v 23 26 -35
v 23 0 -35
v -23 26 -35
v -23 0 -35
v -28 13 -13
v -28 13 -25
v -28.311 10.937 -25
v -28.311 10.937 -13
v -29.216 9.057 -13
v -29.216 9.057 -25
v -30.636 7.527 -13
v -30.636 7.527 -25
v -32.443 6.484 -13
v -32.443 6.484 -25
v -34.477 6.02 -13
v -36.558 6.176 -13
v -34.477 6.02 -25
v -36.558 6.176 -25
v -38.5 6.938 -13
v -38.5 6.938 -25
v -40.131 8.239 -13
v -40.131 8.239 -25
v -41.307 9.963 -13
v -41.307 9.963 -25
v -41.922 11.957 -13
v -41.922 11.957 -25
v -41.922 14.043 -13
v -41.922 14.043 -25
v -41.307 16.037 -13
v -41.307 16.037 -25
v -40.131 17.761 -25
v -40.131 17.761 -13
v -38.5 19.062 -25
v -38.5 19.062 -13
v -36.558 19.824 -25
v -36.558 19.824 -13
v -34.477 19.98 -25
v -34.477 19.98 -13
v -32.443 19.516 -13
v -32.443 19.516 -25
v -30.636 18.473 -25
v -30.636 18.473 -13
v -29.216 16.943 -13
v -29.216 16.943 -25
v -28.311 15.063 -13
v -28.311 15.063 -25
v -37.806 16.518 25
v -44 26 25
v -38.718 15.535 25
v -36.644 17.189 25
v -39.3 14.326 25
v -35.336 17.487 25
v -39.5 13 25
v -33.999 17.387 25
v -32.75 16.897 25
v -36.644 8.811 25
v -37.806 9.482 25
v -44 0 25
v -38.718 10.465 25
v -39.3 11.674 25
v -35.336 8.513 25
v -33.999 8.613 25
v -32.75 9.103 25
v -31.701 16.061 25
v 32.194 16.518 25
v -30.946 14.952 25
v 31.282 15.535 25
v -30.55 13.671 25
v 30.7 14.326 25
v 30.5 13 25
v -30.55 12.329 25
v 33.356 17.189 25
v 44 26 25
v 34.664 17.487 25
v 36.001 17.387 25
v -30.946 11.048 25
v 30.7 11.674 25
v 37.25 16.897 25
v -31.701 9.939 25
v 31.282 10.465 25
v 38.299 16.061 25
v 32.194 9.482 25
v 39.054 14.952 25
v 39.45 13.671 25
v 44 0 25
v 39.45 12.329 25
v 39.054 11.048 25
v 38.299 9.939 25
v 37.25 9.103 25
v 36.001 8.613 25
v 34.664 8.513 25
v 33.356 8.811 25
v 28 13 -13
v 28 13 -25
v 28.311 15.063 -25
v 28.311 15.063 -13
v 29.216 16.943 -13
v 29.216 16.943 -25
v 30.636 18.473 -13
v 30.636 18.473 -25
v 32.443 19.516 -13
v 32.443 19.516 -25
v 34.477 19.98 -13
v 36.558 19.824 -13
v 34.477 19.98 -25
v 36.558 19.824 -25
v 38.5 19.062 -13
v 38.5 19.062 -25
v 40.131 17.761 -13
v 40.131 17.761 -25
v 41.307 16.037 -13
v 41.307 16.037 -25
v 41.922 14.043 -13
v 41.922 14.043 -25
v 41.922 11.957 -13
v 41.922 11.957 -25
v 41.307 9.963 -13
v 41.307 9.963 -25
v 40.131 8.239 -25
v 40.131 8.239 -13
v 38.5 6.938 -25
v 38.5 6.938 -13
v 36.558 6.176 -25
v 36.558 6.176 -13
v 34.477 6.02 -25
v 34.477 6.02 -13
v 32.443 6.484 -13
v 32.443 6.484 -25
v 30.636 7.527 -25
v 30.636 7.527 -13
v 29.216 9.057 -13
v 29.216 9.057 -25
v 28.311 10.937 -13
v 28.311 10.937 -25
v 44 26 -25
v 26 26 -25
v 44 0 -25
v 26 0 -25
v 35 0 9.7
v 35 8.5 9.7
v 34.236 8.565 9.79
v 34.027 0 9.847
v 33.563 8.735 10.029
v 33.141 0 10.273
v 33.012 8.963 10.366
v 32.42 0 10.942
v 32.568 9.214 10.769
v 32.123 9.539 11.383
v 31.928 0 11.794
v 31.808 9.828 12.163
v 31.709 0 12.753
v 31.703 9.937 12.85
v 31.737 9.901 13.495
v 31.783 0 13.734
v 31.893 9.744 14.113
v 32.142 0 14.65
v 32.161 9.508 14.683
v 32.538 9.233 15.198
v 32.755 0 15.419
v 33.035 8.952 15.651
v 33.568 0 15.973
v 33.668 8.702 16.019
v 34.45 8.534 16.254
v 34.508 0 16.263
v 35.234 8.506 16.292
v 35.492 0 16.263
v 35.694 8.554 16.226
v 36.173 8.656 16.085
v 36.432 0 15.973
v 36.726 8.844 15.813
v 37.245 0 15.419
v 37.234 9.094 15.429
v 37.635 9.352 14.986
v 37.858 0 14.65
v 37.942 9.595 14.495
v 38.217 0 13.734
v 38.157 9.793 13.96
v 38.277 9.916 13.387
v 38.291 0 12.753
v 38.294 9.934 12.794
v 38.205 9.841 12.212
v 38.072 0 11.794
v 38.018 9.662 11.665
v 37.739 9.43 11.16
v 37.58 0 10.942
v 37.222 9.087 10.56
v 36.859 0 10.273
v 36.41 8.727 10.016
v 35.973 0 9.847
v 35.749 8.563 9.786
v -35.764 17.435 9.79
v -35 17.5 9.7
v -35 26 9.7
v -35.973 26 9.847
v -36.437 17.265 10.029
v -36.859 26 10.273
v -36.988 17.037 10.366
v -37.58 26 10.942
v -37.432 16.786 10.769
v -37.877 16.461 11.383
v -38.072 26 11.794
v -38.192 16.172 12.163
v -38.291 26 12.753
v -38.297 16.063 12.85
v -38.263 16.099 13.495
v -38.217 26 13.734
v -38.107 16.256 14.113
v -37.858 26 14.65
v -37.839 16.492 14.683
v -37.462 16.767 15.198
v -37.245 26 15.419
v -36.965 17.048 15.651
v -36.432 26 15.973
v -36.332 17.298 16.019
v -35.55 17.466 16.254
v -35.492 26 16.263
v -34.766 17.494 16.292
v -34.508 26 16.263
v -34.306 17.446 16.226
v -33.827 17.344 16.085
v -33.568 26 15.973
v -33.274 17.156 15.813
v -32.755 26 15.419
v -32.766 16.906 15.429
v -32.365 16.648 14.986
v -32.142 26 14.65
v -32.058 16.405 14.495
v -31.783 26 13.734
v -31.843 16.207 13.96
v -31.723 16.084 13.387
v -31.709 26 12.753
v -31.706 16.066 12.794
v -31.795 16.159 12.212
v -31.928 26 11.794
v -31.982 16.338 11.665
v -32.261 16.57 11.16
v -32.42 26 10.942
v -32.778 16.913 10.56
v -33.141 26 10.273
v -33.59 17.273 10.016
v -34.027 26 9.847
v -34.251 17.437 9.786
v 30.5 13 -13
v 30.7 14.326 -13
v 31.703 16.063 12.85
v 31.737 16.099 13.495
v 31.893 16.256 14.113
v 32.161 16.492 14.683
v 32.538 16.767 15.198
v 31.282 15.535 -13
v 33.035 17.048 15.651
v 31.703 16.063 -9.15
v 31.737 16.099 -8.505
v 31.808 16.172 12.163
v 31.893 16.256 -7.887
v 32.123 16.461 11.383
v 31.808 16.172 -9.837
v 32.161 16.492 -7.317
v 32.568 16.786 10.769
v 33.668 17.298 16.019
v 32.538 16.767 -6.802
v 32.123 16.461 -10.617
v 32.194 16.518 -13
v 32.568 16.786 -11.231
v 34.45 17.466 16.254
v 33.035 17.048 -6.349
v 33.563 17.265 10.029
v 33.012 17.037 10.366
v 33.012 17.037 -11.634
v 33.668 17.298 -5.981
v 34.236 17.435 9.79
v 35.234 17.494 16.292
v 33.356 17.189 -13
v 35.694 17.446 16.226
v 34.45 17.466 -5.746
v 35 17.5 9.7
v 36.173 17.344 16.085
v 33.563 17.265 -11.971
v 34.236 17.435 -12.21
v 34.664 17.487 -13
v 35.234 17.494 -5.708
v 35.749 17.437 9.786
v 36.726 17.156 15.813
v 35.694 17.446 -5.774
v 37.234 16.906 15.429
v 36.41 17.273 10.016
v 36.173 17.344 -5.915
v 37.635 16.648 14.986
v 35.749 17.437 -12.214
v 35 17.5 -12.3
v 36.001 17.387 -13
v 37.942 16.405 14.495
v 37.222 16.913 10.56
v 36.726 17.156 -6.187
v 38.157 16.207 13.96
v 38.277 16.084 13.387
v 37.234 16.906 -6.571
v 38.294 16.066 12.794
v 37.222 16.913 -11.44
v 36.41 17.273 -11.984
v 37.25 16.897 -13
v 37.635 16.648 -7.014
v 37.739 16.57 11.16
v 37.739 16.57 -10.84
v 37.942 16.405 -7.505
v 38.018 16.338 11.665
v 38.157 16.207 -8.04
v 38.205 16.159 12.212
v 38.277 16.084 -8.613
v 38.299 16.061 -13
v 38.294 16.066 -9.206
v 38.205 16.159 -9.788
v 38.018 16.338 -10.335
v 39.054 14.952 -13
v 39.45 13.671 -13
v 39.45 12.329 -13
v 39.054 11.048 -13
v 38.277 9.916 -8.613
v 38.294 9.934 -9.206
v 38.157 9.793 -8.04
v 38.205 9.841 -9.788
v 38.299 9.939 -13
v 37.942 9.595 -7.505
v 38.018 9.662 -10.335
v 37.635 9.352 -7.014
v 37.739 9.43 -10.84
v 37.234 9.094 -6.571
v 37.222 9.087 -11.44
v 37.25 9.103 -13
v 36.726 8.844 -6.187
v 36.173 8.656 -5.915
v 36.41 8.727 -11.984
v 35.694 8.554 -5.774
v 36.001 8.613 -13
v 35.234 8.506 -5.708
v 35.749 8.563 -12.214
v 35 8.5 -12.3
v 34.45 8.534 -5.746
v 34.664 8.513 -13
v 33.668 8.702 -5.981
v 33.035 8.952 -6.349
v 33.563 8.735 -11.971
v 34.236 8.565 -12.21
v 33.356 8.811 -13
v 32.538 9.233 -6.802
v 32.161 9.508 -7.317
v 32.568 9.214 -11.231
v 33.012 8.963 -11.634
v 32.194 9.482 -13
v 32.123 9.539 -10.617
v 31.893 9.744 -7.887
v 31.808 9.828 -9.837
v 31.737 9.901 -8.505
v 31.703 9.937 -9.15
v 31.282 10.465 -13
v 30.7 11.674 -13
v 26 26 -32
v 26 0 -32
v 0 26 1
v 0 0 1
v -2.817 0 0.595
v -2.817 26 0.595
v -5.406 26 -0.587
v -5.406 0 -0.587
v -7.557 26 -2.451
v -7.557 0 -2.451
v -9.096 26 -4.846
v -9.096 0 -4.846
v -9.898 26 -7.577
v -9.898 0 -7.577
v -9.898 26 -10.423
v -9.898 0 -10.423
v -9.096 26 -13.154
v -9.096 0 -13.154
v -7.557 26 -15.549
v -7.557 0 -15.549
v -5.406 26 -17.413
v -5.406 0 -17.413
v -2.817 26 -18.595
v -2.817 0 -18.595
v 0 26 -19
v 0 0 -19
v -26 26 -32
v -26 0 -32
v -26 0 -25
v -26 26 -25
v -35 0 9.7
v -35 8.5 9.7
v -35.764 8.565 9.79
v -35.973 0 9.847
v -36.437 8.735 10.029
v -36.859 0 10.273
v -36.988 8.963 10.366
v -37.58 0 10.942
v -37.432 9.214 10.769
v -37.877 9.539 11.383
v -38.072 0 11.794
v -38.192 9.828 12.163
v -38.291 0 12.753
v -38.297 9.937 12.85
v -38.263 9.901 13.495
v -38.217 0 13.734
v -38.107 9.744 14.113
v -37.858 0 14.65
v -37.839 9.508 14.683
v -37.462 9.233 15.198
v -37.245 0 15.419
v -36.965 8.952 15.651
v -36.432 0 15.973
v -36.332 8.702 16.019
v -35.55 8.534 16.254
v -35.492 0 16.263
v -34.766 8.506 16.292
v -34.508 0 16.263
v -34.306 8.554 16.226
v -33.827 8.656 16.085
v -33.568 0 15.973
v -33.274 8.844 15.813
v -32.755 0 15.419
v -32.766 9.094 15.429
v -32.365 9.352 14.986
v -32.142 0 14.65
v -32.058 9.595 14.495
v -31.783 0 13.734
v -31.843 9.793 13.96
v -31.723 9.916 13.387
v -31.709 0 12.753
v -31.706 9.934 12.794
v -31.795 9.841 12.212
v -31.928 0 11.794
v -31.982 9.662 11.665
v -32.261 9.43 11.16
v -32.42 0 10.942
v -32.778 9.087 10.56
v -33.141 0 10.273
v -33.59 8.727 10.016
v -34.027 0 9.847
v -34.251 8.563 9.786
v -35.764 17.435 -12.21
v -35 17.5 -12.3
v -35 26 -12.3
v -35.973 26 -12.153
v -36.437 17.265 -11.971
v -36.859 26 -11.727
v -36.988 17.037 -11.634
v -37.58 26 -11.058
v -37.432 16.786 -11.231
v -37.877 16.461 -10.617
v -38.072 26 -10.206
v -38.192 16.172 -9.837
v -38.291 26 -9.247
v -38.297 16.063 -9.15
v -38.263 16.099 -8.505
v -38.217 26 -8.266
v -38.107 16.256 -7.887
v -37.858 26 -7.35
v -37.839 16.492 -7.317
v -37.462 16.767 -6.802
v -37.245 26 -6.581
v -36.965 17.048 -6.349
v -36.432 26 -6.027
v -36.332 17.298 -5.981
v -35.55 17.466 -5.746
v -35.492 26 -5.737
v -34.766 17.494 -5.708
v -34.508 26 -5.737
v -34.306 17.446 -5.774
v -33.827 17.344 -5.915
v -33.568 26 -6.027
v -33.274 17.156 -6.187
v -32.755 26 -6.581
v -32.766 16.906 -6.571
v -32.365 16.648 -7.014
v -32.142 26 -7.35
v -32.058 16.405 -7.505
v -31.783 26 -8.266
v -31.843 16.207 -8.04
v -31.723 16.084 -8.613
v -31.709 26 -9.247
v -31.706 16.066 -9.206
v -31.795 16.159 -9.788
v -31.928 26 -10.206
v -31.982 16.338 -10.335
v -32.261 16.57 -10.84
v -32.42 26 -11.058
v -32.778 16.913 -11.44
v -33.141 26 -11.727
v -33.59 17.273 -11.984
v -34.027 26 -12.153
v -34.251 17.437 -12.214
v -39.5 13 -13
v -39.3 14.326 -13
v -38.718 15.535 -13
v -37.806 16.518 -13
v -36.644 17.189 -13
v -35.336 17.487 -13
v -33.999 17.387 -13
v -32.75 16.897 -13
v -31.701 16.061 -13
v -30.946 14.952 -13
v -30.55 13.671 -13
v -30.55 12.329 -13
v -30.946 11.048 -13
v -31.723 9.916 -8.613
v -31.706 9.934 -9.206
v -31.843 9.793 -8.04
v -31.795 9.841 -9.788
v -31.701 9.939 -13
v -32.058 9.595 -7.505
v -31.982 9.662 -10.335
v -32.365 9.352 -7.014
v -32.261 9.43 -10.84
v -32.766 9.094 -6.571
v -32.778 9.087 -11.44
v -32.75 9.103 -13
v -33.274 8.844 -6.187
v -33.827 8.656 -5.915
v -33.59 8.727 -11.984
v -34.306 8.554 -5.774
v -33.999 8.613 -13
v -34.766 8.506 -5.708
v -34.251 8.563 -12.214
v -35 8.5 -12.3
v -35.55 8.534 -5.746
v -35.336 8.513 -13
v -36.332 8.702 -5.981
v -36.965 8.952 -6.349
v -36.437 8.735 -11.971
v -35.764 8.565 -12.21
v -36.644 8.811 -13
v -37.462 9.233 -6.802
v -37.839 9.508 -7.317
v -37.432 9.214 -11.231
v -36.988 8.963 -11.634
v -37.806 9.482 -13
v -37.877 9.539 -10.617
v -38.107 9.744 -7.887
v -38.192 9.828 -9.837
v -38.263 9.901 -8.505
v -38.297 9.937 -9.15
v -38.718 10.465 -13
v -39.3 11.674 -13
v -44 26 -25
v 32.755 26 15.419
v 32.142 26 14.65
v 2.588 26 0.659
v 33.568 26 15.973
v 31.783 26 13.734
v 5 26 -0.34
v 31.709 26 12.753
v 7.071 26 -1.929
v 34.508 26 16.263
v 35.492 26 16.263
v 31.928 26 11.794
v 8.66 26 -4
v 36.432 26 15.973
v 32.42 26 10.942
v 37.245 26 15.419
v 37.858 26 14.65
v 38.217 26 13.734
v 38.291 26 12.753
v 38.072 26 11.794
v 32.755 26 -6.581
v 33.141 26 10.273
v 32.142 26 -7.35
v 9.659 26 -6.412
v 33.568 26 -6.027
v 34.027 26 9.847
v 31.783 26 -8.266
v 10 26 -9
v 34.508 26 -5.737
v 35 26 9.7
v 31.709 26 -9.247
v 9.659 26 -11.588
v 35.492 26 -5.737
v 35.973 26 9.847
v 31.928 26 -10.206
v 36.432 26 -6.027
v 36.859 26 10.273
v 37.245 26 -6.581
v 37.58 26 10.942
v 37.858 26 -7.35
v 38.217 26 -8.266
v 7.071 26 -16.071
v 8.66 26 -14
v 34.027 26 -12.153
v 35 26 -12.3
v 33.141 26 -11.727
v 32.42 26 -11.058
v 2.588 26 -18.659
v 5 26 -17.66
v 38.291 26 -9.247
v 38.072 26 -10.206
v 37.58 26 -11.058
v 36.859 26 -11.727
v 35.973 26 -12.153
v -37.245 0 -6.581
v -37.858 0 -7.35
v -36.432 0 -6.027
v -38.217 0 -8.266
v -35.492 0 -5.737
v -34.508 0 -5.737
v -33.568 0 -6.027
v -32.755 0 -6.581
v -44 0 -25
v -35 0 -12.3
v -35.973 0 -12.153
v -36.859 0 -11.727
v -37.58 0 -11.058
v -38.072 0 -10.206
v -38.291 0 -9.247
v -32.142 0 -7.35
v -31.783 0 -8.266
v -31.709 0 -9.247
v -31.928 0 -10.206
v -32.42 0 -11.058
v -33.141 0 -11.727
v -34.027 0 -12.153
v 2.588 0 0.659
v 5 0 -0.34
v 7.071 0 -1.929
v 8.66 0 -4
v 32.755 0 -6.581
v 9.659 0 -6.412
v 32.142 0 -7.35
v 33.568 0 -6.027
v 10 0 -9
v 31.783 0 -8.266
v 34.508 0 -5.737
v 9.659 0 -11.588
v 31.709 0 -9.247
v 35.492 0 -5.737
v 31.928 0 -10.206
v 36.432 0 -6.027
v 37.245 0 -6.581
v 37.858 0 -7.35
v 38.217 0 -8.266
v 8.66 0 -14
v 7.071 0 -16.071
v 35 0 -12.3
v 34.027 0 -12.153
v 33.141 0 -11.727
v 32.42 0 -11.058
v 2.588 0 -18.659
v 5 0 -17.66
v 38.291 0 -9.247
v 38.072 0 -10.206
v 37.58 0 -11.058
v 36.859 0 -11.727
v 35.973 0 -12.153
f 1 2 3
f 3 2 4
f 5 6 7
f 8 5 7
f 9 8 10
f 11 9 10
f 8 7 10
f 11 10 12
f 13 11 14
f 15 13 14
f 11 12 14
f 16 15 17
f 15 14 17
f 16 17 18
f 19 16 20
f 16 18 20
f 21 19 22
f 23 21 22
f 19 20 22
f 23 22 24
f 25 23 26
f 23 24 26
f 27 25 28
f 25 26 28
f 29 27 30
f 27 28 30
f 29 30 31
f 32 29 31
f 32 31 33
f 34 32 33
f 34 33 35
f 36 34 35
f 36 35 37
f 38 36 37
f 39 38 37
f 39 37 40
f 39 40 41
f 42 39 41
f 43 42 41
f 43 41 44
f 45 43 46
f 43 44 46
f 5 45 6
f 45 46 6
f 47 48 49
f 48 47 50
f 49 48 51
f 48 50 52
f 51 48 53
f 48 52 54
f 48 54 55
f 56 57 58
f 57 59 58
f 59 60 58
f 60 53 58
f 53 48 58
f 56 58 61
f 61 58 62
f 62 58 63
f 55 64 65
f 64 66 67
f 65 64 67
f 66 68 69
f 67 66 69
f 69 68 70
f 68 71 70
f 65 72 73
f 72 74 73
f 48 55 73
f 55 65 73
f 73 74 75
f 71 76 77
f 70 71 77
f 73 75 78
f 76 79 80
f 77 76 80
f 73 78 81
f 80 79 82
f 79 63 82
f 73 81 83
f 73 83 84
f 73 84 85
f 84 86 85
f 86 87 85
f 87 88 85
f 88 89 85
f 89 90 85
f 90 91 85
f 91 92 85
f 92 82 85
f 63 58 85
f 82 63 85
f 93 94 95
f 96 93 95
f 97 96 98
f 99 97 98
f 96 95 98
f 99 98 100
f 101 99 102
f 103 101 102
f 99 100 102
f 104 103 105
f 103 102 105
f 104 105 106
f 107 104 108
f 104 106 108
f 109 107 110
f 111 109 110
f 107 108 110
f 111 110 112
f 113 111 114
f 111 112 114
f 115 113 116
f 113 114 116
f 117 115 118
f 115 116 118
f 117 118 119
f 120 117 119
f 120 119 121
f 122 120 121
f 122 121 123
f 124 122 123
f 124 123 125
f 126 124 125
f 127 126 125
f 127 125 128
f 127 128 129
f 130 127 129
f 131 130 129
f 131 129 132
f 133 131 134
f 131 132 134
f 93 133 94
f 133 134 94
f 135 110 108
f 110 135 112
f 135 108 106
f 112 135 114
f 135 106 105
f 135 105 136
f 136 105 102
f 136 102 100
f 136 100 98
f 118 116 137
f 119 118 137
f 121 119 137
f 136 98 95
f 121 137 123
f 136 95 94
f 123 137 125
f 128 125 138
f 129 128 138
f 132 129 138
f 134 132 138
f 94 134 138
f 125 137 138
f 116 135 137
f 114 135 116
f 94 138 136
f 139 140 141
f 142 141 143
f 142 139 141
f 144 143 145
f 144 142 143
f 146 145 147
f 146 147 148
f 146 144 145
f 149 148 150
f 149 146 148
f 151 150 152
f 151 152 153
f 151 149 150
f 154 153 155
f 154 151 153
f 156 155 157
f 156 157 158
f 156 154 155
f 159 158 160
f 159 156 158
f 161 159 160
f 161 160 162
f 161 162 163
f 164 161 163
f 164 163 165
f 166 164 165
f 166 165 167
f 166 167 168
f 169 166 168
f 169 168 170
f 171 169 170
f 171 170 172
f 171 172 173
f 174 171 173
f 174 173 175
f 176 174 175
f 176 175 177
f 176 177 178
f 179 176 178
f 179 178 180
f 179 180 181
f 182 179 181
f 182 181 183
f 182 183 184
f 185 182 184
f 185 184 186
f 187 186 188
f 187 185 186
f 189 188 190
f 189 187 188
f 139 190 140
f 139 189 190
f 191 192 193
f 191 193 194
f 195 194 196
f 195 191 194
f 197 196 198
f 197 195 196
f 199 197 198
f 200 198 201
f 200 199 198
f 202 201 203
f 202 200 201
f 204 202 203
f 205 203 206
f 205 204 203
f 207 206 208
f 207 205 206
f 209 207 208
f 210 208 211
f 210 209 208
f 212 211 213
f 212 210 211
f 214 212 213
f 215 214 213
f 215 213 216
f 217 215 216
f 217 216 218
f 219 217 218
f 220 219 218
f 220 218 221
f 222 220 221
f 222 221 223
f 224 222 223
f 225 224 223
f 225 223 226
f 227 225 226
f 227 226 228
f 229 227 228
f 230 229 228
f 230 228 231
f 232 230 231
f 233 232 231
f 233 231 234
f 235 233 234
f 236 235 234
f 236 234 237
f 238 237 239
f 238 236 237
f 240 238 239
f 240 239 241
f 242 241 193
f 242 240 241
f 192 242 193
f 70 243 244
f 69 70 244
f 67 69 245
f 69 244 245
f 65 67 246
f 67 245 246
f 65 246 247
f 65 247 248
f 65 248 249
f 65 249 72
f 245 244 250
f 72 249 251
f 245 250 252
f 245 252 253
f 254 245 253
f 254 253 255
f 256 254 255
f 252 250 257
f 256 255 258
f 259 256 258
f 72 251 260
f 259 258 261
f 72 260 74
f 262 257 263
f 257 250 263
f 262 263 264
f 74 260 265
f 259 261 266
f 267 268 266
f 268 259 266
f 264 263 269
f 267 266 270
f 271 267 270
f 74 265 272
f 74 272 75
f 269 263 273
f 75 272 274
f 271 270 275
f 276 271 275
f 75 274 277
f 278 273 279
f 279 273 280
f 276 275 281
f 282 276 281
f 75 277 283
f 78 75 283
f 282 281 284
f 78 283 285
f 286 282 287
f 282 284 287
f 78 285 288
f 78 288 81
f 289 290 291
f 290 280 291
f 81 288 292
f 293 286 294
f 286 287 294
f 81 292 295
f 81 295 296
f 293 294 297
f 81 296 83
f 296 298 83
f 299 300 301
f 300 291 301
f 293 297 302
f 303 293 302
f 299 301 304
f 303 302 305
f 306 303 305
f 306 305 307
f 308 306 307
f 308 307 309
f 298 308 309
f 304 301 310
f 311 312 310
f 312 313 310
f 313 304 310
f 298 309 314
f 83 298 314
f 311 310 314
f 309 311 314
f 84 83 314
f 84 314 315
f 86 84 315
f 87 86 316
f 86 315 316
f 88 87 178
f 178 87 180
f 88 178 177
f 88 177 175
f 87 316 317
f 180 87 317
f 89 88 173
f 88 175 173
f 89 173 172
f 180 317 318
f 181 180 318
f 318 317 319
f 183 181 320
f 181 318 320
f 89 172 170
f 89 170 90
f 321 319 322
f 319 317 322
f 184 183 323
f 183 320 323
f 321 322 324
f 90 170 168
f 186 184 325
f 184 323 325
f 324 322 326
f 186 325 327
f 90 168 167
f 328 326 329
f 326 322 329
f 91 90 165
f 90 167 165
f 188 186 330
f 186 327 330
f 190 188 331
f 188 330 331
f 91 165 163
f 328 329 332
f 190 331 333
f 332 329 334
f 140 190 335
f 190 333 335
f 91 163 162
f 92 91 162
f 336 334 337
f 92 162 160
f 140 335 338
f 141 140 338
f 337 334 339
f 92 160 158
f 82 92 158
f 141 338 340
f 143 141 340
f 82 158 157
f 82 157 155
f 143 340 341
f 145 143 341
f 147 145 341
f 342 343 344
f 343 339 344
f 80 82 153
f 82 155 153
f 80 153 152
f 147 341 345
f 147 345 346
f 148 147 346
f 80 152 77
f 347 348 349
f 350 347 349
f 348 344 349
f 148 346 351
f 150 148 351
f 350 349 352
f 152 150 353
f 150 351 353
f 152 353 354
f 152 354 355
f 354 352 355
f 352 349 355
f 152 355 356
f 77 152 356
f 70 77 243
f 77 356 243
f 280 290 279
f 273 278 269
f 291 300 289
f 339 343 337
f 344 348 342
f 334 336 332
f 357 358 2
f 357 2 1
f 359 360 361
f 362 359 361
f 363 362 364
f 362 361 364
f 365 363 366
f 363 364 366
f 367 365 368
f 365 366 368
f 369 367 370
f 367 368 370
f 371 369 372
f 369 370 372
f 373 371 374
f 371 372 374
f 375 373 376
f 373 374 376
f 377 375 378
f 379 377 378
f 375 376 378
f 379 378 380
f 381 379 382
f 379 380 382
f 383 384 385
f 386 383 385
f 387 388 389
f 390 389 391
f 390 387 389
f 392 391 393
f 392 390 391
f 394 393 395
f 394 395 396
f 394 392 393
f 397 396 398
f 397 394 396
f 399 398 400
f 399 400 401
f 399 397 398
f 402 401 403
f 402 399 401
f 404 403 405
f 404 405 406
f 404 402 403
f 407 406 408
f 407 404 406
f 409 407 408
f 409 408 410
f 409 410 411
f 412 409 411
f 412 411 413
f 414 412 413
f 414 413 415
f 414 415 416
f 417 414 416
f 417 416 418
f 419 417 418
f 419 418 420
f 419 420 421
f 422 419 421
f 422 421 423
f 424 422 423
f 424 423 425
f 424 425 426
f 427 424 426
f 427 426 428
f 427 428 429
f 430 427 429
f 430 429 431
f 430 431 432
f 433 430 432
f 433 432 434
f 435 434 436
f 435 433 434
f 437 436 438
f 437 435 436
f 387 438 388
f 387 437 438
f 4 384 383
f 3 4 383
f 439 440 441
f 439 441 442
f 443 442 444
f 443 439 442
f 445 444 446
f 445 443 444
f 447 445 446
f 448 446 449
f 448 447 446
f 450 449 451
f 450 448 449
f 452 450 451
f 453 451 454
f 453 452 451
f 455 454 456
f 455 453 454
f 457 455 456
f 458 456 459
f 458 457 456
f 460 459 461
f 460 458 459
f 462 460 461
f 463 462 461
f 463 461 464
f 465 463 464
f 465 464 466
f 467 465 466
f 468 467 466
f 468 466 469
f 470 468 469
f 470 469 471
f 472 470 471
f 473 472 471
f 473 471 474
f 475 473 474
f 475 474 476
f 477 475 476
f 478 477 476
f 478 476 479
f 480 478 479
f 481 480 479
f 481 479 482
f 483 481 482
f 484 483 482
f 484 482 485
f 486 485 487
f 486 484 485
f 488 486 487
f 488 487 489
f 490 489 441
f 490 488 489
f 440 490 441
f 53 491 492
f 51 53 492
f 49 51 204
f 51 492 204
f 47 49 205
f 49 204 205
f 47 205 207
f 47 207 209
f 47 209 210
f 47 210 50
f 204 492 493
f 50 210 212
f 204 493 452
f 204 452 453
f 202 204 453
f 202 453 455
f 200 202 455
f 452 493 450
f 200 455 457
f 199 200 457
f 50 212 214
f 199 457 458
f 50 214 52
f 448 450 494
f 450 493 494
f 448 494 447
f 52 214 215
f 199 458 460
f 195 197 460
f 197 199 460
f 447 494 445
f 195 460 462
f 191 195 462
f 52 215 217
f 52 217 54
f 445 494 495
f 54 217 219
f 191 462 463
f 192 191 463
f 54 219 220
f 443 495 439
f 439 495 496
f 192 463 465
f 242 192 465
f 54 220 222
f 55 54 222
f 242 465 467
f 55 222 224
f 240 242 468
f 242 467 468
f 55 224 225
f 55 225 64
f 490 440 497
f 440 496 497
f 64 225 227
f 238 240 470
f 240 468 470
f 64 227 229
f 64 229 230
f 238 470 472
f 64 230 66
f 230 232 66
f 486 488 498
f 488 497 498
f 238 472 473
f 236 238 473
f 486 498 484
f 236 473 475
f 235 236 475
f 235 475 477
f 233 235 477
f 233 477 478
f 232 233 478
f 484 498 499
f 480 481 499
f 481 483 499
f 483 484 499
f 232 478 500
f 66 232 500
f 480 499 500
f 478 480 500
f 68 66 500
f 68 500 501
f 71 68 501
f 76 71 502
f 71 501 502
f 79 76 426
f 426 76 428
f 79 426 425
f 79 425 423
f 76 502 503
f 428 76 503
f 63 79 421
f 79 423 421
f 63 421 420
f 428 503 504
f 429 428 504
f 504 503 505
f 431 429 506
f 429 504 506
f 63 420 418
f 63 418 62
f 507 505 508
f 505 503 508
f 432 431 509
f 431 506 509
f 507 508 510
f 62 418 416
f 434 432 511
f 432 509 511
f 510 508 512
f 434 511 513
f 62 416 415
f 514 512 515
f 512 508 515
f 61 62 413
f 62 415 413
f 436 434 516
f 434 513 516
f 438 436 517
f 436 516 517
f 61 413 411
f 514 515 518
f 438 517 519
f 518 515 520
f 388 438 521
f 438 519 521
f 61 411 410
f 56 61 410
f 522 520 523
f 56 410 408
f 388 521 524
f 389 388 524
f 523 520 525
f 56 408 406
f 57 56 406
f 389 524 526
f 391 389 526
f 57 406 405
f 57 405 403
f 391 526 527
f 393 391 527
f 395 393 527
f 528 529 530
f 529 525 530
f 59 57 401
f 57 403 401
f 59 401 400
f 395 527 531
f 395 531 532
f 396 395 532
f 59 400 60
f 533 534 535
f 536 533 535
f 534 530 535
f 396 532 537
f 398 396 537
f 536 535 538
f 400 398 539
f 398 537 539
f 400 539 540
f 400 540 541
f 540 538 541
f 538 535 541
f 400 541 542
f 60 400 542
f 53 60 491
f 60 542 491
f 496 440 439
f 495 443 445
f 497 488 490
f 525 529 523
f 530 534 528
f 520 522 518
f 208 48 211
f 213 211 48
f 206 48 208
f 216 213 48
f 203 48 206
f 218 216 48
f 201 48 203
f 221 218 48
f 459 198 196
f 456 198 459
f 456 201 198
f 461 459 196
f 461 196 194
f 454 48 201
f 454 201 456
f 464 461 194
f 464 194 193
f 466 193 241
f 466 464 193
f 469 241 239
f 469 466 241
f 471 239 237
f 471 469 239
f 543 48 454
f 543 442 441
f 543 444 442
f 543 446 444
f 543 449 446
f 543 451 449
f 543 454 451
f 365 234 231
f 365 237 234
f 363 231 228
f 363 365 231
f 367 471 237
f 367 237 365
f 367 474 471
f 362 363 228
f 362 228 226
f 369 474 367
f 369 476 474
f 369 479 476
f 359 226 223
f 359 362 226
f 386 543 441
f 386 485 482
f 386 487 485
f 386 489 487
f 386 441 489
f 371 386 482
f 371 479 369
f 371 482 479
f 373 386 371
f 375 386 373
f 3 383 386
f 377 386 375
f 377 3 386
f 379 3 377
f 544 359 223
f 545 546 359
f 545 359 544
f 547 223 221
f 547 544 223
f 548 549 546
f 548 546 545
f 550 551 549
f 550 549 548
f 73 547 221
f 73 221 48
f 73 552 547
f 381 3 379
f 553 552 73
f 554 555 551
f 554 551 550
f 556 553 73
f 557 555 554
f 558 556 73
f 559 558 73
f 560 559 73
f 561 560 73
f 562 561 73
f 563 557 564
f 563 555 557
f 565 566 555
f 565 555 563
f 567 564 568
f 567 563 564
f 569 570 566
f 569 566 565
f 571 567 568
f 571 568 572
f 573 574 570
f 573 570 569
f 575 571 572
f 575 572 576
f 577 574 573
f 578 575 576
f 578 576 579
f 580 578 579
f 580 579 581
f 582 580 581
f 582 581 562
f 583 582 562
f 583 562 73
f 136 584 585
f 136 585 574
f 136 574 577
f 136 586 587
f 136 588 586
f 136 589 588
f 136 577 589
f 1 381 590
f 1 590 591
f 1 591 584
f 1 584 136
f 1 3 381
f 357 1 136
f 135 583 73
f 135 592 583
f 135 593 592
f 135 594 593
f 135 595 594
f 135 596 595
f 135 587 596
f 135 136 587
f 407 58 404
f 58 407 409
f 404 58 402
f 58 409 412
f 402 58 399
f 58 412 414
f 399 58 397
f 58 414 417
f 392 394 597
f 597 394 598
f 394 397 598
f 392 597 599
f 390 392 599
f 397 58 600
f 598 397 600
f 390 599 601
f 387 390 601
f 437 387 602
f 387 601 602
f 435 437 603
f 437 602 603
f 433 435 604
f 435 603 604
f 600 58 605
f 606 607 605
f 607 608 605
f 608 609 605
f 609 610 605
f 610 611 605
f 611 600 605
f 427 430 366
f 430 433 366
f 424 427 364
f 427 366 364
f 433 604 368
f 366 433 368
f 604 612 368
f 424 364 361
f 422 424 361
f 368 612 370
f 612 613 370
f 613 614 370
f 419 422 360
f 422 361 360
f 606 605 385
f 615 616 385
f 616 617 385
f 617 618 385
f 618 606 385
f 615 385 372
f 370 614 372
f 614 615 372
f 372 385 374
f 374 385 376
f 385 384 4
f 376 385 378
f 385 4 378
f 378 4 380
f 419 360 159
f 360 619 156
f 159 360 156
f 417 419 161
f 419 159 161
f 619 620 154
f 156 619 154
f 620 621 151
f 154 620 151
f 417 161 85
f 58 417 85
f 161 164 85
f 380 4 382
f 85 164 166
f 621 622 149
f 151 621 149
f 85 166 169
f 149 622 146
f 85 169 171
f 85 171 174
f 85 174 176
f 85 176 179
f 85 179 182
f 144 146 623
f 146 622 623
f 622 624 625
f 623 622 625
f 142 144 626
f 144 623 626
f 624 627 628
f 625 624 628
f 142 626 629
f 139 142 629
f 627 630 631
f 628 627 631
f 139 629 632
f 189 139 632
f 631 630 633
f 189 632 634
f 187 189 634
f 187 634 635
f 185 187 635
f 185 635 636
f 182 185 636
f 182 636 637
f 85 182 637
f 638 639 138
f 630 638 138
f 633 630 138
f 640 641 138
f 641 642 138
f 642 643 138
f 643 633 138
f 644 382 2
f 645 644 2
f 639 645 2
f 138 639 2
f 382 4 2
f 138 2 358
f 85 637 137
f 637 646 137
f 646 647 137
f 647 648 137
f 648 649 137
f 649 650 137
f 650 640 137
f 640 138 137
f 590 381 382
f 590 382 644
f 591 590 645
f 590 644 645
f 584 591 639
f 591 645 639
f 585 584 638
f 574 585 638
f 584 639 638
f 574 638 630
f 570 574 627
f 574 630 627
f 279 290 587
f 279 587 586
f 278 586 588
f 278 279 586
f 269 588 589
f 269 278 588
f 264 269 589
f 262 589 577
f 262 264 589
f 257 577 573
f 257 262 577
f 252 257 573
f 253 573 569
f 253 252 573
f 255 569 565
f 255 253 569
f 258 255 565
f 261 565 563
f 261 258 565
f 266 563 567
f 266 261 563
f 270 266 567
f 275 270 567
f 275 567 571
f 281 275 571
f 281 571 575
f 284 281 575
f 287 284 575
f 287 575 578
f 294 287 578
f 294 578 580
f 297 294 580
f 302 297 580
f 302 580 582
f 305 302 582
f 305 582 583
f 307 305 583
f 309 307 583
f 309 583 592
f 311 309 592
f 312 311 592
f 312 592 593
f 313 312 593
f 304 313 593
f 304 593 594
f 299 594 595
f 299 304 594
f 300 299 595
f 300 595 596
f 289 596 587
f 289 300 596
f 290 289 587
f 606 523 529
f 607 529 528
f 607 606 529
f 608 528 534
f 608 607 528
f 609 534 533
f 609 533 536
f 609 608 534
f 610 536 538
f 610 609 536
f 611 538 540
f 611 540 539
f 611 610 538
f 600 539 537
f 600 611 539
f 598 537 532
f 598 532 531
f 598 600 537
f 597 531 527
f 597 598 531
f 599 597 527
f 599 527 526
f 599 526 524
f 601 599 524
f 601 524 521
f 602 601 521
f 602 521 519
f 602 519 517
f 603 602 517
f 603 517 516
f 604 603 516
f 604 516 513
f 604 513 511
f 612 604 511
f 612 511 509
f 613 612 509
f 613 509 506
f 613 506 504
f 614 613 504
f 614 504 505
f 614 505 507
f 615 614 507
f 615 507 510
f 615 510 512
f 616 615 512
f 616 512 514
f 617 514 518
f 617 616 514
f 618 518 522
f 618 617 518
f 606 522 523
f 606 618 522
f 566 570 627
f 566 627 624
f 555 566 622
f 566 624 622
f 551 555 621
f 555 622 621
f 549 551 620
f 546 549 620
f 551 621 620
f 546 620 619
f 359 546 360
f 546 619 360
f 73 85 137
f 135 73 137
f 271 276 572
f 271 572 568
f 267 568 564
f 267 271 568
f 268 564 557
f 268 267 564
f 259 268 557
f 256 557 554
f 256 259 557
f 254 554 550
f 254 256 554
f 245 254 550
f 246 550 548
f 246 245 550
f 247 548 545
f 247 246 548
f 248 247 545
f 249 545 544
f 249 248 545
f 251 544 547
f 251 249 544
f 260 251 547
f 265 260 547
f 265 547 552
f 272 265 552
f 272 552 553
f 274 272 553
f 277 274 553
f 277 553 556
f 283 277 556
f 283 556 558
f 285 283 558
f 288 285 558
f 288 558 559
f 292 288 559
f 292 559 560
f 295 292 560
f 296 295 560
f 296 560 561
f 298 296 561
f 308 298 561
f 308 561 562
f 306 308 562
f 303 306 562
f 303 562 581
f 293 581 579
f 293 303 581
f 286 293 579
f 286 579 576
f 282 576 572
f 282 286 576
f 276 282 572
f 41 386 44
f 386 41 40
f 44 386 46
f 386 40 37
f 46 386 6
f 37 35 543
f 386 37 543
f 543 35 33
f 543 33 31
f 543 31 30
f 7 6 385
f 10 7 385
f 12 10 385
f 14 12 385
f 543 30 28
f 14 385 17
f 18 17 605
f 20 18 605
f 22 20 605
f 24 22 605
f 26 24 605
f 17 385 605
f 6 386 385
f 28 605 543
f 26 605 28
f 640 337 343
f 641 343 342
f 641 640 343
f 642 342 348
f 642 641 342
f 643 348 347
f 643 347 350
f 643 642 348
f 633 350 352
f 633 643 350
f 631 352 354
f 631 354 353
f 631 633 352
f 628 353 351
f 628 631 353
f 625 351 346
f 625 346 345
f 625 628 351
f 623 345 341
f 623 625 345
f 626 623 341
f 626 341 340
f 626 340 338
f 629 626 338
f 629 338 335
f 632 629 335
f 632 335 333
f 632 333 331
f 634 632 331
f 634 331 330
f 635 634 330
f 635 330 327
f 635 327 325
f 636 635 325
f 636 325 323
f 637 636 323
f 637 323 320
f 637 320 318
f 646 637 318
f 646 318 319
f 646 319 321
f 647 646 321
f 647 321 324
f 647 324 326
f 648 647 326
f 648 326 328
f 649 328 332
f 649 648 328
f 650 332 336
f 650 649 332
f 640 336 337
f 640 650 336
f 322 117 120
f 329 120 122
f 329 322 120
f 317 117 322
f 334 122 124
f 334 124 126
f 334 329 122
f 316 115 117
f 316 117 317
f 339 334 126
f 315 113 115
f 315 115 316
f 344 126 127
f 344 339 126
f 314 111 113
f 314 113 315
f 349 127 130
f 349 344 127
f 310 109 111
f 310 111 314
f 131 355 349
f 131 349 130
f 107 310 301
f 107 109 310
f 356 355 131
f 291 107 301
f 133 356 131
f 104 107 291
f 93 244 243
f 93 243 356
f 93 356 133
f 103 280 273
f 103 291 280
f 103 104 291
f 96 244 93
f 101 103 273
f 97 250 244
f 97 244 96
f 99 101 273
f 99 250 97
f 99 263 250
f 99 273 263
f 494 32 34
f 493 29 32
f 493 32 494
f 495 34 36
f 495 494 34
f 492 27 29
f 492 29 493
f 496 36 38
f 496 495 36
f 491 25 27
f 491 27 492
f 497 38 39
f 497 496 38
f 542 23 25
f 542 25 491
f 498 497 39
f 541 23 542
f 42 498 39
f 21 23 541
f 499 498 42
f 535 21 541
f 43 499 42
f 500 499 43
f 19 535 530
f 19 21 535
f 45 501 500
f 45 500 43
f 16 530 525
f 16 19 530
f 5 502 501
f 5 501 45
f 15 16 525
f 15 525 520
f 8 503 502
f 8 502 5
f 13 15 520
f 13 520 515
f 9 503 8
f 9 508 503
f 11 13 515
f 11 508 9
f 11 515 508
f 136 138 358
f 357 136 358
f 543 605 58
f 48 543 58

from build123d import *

# Parameters (mm, degrees)
SKETCH_1_R          = 3.3
EXTRUDE_1_DEPTH     = 26
CHAMFER_1_SIZE      = 3
SKETCH_2_R          = 7
CUT_EXTRUDE_1_DEPTH = 12
SKETCH_3_R          = 4.5
CUT_EXTRUDE_2_DEPTH = 64.686733312


with BuildPart() as part:
    # 草图1 → 凸台-拉伸1 (new body)
    # profile 1 of 2: a face of its own
    with BuildSketch(Plane(origin=(0, 0, 0), x_dir=(1, 0, 0), z_dir=(0, 1, 0))):
        with BuildLine():
            Line((0, 19), (0, 35))
            Line((0, 35), (-26, 35))
            Line((-26, 35), (-26, 25))
            Line((-26, 25), (-44, 25))
            Line((-44, 25), (-44, -25))
            Line((-44, -25), (0, -25))
            Line((0, -25), (0, -1))
            ThreePointArc((0, -1), (-10, 9), (0, 19))
        make_face()
        with Locations(Location((-35, -13, 0), (0, 0, 90))):
            Circle(SKETCH_1_R, mode=Mode.SUBTRACT)
        with Locations(Location((-35, 9, 0), (0, 0, 90))):
            Circle(SKETCH_1_R, mode=Mode.SUBTRACT)
    # profile 2 of 2: a face of its own
    with BuildSketch(Plane(origin=(0, 0, 0), x_dir=(1, 0, 0), z_dir=(0, 1, 0))):
        with BuildLine():
            Line((26, 35), (0, 35))
            Line((0, 35), (0, 19))
            ThreePointArc((0, 19), (7.071067812, 16.071067812), (10, 9))
            ThreePointArc((10, 9), (7.071067812, 1.928932188), (0, -1))
            Line((0, -1), (0, -25))
            Line((0, -25), (44, -25))
            Line((44, -25), (44, 25))
            Line((44, 25), (26, 25))
            Line((26, 25), (26, 35))
        make_face()
        with Locations(Location((35, -13, 0), (0, 0, 90))):
            Circle(SKETCH_1_R, mode=Mode.SUBTRACT)
        with Locations(Location((35, 9, 0), (0, 0, 90))):
            Circle(SKETCH_1_R, mode=Mode.SUBTRACT)
    extrude(amount=EXTRUDE_1_DEPTH)

    # 倒角1
    chamfer_1_edges = [part.edges().sort_by_distance(p)[0] for p in [
        (-26, 13, -35),
        (26, 13, -35),
    ]]
    chamfer(chamfer_1_edges, length=CHAMFER_1_SIZE)

    # 草图2 → 切除-拉伸1 (cut)
    with BuildSketch(Plane(origin=(0, 0, -25), x_dir=(-1, 0, 0), z_dir=(0, 0, -1))):
        with Locations((-35, 13)):
            Circle(SKETCH_2_R)
        with Locations(Location((35, 13, 0), (0, 0, 180))):
            Circle(SKETCH_2_R)
    extrude(amount=-CUT_EXTRUDE_1_DEPTH, mode=Mode.SUBTRACT)

    # 草图3 → 切除-拉伸2 (cut, through all)
    with BuildSketch(Plane(origin=(0, 0, -13), x_dir=(-1, 0, 0), z_dir=(0, 0, -1))):
        with Locations((-35, 13)):
            Circle(SKETCH_3_R)
        with Locations((35, 13)):
            Circle(SKETCH_3_R)
    extrude(amount=-CUT_EXTRUDE_2_DEPTH, mode=Mode.SUBTRACT)


solid = part.part
